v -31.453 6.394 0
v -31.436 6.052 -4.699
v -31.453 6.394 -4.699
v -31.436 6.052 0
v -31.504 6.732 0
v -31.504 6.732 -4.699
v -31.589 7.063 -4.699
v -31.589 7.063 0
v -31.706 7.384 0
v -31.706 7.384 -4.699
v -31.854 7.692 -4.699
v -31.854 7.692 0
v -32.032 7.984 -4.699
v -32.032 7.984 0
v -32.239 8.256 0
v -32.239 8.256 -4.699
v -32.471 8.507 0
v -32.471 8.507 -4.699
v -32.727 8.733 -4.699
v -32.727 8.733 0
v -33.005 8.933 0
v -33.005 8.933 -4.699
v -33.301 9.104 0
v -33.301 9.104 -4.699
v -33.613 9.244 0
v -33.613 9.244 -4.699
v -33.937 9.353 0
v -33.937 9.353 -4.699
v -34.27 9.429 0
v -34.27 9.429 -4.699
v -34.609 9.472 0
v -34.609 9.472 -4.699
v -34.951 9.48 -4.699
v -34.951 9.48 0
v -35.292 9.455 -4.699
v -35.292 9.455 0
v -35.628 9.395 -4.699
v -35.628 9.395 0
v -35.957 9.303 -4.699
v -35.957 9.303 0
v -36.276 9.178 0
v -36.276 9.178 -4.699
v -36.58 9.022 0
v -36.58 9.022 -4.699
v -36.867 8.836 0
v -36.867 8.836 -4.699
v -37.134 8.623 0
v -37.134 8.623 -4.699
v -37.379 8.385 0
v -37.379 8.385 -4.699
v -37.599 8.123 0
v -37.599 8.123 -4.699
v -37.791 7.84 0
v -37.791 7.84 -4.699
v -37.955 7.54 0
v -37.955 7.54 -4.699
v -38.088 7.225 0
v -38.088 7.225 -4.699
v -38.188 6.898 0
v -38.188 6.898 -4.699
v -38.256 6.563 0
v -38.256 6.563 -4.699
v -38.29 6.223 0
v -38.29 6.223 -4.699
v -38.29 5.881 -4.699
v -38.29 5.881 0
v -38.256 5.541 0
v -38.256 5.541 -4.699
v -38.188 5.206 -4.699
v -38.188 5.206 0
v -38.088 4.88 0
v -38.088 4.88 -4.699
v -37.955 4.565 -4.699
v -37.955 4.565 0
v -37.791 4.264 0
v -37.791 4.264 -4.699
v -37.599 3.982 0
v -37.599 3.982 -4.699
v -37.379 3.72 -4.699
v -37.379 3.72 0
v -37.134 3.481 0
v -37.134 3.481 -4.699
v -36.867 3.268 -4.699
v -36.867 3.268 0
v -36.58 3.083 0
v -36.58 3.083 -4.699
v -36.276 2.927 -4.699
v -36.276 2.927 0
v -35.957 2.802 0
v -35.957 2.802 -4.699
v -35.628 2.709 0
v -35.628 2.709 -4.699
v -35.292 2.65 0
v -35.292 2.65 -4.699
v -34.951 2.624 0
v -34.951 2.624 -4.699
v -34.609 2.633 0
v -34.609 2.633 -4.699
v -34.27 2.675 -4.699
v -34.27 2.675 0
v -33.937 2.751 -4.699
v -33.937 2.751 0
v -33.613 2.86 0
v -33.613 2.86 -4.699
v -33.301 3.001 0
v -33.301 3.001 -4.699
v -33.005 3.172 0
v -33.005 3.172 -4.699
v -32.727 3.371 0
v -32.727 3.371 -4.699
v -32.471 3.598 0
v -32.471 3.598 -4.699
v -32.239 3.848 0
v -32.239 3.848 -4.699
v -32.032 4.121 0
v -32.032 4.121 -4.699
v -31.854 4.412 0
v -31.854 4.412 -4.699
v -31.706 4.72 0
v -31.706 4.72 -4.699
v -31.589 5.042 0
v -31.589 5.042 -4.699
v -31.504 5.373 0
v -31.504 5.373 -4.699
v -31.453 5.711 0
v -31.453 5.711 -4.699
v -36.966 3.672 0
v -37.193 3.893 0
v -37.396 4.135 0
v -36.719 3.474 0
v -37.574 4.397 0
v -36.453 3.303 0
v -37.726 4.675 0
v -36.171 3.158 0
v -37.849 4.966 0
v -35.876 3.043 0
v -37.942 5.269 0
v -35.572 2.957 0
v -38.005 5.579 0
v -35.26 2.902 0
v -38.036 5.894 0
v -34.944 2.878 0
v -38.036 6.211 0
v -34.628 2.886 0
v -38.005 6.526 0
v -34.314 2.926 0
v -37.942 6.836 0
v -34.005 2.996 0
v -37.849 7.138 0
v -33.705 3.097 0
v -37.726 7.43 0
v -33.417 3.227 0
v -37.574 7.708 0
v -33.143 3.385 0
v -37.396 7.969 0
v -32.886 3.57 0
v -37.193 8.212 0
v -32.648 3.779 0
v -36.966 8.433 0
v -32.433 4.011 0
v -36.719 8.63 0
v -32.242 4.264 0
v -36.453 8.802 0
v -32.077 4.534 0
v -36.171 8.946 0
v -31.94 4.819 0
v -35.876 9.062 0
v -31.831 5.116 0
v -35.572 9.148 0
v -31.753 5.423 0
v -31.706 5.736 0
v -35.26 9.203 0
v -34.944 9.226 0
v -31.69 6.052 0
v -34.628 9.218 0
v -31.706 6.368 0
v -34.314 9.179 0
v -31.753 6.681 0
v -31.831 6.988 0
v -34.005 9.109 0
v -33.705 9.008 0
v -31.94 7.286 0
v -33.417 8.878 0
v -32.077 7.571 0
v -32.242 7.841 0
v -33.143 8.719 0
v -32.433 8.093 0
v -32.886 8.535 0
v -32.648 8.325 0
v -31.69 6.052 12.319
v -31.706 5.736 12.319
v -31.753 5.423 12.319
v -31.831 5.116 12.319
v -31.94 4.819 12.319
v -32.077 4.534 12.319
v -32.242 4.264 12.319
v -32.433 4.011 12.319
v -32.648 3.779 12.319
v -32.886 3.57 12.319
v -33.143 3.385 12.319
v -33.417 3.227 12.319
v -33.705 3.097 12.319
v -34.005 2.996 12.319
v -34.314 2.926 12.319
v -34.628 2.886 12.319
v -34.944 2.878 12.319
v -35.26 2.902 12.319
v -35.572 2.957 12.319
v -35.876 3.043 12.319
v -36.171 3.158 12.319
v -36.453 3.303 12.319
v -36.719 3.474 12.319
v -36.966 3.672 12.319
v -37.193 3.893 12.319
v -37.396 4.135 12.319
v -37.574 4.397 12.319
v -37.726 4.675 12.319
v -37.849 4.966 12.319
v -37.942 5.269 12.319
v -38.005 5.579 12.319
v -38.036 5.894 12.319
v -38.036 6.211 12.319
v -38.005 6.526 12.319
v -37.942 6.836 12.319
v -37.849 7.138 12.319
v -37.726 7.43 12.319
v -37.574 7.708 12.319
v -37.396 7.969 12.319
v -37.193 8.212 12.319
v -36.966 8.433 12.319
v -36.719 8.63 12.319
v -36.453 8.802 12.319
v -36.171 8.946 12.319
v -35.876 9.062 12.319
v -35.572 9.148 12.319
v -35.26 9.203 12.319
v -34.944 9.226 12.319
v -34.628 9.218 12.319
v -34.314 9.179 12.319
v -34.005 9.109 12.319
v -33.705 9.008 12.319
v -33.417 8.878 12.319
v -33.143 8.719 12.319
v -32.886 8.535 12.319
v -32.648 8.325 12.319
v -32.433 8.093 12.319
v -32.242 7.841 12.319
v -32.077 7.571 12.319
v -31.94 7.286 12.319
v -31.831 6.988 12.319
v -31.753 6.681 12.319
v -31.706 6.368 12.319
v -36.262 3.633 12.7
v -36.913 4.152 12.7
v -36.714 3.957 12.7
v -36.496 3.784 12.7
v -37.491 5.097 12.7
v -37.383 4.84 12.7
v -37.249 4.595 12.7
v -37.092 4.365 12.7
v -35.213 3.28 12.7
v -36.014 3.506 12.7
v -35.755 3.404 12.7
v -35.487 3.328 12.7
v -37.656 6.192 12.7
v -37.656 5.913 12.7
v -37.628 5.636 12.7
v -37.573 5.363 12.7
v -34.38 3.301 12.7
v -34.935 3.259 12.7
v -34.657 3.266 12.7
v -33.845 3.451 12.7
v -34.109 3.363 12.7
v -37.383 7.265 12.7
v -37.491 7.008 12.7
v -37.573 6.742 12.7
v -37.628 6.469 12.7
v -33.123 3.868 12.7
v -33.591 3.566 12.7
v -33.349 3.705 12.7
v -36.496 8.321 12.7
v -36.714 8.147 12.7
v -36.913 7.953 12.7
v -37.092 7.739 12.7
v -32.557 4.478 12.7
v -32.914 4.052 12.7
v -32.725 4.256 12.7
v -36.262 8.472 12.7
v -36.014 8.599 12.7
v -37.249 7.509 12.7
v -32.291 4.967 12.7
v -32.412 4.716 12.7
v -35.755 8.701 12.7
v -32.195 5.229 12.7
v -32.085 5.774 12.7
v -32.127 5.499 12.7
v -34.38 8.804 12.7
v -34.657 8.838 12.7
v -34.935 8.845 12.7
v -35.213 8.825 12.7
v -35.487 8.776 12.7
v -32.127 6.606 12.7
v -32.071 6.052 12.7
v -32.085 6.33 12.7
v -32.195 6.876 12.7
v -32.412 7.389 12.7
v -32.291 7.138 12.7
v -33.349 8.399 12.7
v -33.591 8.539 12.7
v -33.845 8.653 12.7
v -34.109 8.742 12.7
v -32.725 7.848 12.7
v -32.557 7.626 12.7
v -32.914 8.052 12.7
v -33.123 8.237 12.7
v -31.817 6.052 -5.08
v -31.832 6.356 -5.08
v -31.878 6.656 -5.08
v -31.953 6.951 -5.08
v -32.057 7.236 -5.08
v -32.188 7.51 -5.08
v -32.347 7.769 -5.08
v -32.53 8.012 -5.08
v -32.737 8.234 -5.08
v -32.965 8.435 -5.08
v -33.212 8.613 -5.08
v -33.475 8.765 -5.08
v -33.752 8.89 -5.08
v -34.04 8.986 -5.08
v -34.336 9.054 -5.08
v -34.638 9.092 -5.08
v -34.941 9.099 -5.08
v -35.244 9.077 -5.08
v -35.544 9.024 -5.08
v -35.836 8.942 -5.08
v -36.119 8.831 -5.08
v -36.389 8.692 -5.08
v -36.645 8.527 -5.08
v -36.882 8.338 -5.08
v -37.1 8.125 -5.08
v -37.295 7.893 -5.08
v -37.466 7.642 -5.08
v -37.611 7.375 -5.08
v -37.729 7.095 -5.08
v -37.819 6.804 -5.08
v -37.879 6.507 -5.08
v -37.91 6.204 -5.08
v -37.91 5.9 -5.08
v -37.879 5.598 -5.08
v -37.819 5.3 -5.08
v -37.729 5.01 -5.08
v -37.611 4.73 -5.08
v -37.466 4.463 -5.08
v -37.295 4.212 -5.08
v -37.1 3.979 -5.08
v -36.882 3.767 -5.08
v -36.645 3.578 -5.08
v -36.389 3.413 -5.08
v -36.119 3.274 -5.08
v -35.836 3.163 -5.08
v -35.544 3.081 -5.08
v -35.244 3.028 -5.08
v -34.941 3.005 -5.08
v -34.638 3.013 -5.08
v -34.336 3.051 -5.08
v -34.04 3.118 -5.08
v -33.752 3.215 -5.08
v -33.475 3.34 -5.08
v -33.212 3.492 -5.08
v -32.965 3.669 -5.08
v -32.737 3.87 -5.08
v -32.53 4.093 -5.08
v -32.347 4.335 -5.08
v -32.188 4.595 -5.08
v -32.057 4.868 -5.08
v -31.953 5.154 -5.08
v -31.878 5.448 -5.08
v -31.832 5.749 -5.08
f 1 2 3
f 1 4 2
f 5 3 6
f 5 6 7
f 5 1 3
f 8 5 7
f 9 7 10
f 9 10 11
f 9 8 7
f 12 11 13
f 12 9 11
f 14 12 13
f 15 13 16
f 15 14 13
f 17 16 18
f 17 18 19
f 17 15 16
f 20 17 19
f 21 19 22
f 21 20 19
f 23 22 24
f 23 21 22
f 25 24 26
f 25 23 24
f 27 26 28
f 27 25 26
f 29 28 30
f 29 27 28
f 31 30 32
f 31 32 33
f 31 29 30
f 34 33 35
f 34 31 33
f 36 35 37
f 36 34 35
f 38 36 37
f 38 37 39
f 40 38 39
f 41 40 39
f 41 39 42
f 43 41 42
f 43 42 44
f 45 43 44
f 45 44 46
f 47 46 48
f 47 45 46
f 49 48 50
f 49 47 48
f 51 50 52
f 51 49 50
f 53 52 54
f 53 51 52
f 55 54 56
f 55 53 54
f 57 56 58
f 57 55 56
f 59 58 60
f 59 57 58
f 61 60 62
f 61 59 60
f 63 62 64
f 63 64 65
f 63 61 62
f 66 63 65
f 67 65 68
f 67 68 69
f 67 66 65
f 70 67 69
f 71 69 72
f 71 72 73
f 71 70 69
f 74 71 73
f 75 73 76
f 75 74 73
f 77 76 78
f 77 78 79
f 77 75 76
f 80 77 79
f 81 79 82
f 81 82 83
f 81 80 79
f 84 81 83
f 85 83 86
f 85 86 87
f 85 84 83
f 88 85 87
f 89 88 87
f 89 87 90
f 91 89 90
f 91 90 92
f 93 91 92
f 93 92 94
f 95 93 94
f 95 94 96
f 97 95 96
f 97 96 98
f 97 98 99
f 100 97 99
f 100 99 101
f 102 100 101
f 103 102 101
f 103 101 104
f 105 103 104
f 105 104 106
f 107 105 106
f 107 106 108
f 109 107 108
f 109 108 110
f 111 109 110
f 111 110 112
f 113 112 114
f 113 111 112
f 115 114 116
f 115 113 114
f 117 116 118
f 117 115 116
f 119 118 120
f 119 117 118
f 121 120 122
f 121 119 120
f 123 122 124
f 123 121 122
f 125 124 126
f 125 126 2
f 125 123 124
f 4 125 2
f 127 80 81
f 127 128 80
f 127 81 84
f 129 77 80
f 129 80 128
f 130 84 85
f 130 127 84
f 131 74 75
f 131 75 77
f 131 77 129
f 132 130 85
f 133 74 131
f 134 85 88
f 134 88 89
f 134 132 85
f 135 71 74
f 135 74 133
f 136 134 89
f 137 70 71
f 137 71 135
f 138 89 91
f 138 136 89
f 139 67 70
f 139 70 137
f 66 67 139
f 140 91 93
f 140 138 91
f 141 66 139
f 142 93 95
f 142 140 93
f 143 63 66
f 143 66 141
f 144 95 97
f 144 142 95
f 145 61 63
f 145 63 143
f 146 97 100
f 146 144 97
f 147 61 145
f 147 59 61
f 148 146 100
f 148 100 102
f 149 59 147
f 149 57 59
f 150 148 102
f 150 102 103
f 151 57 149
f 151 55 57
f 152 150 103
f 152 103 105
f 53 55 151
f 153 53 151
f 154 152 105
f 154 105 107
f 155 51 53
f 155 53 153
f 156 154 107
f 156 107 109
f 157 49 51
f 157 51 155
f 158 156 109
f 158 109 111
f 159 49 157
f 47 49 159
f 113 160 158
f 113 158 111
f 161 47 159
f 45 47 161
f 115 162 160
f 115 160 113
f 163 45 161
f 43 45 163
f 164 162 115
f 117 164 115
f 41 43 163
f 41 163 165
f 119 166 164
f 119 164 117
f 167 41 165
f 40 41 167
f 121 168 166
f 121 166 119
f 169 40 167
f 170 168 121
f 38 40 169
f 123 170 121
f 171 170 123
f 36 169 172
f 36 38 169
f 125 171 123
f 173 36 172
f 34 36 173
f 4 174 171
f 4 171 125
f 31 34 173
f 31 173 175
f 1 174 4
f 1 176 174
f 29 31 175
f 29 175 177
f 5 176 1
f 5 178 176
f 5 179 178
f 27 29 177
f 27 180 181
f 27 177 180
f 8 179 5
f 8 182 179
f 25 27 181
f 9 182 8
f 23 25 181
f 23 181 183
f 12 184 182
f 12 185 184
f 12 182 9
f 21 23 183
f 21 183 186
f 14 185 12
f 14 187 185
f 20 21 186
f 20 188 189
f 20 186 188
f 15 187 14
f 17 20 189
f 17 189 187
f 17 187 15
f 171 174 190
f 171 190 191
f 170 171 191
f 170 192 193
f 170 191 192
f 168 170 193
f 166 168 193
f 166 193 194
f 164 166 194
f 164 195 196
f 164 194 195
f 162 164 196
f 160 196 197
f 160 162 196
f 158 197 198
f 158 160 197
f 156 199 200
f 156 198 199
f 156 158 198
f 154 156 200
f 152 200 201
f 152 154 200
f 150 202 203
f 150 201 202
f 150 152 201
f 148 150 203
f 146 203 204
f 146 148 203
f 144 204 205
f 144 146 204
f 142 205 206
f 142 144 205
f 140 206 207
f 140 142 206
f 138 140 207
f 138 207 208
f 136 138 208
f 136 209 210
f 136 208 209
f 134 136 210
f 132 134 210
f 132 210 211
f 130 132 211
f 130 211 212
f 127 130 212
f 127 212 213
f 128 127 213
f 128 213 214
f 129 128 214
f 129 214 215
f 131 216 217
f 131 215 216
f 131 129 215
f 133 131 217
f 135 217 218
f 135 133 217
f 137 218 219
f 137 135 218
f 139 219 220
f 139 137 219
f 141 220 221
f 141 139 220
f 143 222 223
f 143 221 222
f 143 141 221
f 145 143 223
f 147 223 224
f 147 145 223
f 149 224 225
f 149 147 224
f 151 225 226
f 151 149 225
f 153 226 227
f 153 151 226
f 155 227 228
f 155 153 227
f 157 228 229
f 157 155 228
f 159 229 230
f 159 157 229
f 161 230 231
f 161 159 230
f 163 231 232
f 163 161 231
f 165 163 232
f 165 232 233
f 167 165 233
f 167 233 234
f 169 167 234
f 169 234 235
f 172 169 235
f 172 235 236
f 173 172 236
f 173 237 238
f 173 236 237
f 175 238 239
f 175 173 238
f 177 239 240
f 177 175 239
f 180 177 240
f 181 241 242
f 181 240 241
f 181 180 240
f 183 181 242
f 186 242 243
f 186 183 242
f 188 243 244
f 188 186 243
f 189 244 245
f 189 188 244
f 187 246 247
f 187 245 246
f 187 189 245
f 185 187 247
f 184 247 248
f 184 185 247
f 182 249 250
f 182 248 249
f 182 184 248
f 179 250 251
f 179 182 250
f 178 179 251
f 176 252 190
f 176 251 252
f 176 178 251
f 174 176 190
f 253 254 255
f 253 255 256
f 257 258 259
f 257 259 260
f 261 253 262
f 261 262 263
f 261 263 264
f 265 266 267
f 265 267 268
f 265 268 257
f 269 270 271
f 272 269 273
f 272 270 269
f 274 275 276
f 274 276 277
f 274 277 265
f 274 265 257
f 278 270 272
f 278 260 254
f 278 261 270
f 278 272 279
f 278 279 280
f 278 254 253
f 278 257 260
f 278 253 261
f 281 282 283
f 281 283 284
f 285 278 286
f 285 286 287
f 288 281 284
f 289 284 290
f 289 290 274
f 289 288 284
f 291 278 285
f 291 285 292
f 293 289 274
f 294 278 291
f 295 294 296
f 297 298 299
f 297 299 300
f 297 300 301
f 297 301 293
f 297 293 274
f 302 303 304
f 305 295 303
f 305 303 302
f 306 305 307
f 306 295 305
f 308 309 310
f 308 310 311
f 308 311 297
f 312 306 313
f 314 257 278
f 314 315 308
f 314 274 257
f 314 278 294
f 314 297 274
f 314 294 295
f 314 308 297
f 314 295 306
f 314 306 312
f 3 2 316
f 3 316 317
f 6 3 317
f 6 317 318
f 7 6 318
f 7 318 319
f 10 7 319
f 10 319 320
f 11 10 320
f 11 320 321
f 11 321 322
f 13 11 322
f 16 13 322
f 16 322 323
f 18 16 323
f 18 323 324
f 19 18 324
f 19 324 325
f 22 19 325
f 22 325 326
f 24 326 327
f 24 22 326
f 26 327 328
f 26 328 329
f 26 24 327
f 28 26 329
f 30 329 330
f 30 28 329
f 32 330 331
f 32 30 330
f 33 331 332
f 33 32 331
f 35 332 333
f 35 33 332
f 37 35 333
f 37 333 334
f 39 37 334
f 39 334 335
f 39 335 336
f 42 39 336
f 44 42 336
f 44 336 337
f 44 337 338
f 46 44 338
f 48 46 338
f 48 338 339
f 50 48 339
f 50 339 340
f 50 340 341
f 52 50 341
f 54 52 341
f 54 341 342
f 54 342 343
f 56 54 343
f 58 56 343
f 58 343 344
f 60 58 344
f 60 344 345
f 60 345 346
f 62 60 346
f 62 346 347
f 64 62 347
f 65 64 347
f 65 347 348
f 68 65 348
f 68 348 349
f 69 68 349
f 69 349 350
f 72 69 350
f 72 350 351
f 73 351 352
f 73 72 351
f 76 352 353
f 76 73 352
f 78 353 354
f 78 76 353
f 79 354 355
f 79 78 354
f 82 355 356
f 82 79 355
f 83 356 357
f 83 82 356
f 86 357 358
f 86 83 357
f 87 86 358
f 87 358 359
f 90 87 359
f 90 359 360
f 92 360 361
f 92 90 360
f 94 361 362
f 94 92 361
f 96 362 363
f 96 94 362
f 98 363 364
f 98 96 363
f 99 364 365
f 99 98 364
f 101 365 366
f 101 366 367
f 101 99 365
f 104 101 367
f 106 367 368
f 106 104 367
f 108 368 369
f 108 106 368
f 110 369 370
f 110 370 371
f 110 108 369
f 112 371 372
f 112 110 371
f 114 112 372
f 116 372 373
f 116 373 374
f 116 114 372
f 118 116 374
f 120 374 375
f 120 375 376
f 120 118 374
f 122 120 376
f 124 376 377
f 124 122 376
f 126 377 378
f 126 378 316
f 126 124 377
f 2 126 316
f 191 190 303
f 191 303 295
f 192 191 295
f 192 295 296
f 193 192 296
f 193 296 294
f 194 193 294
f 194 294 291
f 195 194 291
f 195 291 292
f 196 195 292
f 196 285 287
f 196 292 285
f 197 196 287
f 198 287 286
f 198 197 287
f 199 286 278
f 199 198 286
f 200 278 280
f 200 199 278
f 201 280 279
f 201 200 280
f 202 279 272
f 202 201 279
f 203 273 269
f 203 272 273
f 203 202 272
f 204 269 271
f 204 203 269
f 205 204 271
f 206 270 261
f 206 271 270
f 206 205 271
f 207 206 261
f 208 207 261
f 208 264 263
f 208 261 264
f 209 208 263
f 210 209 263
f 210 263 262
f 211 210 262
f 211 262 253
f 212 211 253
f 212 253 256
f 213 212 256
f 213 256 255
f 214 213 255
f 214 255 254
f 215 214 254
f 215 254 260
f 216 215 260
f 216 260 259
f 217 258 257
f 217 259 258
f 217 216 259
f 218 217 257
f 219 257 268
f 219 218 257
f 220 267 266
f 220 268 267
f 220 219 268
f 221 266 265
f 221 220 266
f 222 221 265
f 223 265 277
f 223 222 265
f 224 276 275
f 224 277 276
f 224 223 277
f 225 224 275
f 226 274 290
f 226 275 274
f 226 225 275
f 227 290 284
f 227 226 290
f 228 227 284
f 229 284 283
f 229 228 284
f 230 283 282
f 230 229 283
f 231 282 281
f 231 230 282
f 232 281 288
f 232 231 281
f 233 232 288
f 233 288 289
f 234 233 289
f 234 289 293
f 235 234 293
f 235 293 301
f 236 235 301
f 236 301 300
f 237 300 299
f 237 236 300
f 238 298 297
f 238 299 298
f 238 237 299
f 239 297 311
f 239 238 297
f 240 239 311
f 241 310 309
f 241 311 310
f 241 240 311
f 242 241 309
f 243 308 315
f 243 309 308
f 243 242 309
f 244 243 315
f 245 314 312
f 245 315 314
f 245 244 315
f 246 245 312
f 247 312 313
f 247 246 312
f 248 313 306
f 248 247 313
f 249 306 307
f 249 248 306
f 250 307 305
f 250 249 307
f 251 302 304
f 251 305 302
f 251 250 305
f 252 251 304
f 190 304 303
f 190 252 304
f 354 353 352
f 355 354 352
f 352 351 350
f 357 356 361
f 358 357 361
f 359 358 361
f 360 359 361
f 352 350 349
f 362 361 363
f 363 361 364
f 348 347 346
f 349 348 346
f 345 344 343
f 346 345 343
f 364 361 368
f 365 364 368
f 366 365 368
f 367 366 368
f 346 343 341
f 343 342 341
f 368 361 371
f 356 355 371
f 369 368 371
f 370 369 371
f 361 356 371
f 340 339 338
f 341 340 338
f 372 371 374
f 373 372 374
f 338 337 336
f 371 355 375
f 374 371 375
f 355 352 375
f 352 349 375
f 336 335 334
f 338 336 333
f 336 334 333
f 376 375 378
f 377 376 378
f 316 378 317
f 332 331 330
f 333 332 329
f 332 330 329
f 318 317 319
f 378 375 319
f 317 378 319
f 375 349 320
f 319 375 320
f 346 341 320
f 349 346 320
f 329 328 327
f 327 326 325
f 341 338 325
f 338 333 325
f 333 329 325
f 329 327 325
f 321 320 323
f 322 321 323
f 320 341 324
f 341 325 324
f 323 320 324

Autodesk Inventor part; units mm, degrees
ref_plane "YZ Plane" through (0, 0, 0) normal (1, 0, 0) x (0, 1, 0)
ref_plane "XZ Plane" through (0, 0, 0) normal (0, 1, 0) x (-1, 0, 0)
ref_plane "XY Plane" through (0, 0, 0) normal (0, 0, 1) x (1, 0, 0)
sketch "Sketch1" plane through (0, 0, 0) normal (0, 0, 1) x (1, 0, 0)
  circle A0 centre (-34.8653, 6.0523) radius 3.429
  circle A1 centre (-34.8653, 6.0523) radius 3.429
  dimension "d0" = 6.858
extrude "Extrusion1" add sketch "Sketch1" against normal blind 5.08
chamfer "Chamfer1" distance 0.381 angle 45 1 edges at (-38.2943, 6.0523, -5.08)
sketch "Sketch2" plane through (-34.8653, 6.0523, 0) normal (0, 0, 1) x (1, 0, 0)
  circle A0 centre (0, 0) radius 3.429
  circle A1 centre (0, 0) radius 3.175
  dimension "d5" = 6.35
extrude "Extrusion2" add sketch "Sketch2" along normal blind 12.7 contours A1
chamfer "Chamfer2" distance 0.381 angle 45 1 edges at (-38.0403, 6.0523, 12.7)
thread "Thread1"
properties part number "BUSS-STUD-250X50" material "Steel, High Strength Low Alloy"
